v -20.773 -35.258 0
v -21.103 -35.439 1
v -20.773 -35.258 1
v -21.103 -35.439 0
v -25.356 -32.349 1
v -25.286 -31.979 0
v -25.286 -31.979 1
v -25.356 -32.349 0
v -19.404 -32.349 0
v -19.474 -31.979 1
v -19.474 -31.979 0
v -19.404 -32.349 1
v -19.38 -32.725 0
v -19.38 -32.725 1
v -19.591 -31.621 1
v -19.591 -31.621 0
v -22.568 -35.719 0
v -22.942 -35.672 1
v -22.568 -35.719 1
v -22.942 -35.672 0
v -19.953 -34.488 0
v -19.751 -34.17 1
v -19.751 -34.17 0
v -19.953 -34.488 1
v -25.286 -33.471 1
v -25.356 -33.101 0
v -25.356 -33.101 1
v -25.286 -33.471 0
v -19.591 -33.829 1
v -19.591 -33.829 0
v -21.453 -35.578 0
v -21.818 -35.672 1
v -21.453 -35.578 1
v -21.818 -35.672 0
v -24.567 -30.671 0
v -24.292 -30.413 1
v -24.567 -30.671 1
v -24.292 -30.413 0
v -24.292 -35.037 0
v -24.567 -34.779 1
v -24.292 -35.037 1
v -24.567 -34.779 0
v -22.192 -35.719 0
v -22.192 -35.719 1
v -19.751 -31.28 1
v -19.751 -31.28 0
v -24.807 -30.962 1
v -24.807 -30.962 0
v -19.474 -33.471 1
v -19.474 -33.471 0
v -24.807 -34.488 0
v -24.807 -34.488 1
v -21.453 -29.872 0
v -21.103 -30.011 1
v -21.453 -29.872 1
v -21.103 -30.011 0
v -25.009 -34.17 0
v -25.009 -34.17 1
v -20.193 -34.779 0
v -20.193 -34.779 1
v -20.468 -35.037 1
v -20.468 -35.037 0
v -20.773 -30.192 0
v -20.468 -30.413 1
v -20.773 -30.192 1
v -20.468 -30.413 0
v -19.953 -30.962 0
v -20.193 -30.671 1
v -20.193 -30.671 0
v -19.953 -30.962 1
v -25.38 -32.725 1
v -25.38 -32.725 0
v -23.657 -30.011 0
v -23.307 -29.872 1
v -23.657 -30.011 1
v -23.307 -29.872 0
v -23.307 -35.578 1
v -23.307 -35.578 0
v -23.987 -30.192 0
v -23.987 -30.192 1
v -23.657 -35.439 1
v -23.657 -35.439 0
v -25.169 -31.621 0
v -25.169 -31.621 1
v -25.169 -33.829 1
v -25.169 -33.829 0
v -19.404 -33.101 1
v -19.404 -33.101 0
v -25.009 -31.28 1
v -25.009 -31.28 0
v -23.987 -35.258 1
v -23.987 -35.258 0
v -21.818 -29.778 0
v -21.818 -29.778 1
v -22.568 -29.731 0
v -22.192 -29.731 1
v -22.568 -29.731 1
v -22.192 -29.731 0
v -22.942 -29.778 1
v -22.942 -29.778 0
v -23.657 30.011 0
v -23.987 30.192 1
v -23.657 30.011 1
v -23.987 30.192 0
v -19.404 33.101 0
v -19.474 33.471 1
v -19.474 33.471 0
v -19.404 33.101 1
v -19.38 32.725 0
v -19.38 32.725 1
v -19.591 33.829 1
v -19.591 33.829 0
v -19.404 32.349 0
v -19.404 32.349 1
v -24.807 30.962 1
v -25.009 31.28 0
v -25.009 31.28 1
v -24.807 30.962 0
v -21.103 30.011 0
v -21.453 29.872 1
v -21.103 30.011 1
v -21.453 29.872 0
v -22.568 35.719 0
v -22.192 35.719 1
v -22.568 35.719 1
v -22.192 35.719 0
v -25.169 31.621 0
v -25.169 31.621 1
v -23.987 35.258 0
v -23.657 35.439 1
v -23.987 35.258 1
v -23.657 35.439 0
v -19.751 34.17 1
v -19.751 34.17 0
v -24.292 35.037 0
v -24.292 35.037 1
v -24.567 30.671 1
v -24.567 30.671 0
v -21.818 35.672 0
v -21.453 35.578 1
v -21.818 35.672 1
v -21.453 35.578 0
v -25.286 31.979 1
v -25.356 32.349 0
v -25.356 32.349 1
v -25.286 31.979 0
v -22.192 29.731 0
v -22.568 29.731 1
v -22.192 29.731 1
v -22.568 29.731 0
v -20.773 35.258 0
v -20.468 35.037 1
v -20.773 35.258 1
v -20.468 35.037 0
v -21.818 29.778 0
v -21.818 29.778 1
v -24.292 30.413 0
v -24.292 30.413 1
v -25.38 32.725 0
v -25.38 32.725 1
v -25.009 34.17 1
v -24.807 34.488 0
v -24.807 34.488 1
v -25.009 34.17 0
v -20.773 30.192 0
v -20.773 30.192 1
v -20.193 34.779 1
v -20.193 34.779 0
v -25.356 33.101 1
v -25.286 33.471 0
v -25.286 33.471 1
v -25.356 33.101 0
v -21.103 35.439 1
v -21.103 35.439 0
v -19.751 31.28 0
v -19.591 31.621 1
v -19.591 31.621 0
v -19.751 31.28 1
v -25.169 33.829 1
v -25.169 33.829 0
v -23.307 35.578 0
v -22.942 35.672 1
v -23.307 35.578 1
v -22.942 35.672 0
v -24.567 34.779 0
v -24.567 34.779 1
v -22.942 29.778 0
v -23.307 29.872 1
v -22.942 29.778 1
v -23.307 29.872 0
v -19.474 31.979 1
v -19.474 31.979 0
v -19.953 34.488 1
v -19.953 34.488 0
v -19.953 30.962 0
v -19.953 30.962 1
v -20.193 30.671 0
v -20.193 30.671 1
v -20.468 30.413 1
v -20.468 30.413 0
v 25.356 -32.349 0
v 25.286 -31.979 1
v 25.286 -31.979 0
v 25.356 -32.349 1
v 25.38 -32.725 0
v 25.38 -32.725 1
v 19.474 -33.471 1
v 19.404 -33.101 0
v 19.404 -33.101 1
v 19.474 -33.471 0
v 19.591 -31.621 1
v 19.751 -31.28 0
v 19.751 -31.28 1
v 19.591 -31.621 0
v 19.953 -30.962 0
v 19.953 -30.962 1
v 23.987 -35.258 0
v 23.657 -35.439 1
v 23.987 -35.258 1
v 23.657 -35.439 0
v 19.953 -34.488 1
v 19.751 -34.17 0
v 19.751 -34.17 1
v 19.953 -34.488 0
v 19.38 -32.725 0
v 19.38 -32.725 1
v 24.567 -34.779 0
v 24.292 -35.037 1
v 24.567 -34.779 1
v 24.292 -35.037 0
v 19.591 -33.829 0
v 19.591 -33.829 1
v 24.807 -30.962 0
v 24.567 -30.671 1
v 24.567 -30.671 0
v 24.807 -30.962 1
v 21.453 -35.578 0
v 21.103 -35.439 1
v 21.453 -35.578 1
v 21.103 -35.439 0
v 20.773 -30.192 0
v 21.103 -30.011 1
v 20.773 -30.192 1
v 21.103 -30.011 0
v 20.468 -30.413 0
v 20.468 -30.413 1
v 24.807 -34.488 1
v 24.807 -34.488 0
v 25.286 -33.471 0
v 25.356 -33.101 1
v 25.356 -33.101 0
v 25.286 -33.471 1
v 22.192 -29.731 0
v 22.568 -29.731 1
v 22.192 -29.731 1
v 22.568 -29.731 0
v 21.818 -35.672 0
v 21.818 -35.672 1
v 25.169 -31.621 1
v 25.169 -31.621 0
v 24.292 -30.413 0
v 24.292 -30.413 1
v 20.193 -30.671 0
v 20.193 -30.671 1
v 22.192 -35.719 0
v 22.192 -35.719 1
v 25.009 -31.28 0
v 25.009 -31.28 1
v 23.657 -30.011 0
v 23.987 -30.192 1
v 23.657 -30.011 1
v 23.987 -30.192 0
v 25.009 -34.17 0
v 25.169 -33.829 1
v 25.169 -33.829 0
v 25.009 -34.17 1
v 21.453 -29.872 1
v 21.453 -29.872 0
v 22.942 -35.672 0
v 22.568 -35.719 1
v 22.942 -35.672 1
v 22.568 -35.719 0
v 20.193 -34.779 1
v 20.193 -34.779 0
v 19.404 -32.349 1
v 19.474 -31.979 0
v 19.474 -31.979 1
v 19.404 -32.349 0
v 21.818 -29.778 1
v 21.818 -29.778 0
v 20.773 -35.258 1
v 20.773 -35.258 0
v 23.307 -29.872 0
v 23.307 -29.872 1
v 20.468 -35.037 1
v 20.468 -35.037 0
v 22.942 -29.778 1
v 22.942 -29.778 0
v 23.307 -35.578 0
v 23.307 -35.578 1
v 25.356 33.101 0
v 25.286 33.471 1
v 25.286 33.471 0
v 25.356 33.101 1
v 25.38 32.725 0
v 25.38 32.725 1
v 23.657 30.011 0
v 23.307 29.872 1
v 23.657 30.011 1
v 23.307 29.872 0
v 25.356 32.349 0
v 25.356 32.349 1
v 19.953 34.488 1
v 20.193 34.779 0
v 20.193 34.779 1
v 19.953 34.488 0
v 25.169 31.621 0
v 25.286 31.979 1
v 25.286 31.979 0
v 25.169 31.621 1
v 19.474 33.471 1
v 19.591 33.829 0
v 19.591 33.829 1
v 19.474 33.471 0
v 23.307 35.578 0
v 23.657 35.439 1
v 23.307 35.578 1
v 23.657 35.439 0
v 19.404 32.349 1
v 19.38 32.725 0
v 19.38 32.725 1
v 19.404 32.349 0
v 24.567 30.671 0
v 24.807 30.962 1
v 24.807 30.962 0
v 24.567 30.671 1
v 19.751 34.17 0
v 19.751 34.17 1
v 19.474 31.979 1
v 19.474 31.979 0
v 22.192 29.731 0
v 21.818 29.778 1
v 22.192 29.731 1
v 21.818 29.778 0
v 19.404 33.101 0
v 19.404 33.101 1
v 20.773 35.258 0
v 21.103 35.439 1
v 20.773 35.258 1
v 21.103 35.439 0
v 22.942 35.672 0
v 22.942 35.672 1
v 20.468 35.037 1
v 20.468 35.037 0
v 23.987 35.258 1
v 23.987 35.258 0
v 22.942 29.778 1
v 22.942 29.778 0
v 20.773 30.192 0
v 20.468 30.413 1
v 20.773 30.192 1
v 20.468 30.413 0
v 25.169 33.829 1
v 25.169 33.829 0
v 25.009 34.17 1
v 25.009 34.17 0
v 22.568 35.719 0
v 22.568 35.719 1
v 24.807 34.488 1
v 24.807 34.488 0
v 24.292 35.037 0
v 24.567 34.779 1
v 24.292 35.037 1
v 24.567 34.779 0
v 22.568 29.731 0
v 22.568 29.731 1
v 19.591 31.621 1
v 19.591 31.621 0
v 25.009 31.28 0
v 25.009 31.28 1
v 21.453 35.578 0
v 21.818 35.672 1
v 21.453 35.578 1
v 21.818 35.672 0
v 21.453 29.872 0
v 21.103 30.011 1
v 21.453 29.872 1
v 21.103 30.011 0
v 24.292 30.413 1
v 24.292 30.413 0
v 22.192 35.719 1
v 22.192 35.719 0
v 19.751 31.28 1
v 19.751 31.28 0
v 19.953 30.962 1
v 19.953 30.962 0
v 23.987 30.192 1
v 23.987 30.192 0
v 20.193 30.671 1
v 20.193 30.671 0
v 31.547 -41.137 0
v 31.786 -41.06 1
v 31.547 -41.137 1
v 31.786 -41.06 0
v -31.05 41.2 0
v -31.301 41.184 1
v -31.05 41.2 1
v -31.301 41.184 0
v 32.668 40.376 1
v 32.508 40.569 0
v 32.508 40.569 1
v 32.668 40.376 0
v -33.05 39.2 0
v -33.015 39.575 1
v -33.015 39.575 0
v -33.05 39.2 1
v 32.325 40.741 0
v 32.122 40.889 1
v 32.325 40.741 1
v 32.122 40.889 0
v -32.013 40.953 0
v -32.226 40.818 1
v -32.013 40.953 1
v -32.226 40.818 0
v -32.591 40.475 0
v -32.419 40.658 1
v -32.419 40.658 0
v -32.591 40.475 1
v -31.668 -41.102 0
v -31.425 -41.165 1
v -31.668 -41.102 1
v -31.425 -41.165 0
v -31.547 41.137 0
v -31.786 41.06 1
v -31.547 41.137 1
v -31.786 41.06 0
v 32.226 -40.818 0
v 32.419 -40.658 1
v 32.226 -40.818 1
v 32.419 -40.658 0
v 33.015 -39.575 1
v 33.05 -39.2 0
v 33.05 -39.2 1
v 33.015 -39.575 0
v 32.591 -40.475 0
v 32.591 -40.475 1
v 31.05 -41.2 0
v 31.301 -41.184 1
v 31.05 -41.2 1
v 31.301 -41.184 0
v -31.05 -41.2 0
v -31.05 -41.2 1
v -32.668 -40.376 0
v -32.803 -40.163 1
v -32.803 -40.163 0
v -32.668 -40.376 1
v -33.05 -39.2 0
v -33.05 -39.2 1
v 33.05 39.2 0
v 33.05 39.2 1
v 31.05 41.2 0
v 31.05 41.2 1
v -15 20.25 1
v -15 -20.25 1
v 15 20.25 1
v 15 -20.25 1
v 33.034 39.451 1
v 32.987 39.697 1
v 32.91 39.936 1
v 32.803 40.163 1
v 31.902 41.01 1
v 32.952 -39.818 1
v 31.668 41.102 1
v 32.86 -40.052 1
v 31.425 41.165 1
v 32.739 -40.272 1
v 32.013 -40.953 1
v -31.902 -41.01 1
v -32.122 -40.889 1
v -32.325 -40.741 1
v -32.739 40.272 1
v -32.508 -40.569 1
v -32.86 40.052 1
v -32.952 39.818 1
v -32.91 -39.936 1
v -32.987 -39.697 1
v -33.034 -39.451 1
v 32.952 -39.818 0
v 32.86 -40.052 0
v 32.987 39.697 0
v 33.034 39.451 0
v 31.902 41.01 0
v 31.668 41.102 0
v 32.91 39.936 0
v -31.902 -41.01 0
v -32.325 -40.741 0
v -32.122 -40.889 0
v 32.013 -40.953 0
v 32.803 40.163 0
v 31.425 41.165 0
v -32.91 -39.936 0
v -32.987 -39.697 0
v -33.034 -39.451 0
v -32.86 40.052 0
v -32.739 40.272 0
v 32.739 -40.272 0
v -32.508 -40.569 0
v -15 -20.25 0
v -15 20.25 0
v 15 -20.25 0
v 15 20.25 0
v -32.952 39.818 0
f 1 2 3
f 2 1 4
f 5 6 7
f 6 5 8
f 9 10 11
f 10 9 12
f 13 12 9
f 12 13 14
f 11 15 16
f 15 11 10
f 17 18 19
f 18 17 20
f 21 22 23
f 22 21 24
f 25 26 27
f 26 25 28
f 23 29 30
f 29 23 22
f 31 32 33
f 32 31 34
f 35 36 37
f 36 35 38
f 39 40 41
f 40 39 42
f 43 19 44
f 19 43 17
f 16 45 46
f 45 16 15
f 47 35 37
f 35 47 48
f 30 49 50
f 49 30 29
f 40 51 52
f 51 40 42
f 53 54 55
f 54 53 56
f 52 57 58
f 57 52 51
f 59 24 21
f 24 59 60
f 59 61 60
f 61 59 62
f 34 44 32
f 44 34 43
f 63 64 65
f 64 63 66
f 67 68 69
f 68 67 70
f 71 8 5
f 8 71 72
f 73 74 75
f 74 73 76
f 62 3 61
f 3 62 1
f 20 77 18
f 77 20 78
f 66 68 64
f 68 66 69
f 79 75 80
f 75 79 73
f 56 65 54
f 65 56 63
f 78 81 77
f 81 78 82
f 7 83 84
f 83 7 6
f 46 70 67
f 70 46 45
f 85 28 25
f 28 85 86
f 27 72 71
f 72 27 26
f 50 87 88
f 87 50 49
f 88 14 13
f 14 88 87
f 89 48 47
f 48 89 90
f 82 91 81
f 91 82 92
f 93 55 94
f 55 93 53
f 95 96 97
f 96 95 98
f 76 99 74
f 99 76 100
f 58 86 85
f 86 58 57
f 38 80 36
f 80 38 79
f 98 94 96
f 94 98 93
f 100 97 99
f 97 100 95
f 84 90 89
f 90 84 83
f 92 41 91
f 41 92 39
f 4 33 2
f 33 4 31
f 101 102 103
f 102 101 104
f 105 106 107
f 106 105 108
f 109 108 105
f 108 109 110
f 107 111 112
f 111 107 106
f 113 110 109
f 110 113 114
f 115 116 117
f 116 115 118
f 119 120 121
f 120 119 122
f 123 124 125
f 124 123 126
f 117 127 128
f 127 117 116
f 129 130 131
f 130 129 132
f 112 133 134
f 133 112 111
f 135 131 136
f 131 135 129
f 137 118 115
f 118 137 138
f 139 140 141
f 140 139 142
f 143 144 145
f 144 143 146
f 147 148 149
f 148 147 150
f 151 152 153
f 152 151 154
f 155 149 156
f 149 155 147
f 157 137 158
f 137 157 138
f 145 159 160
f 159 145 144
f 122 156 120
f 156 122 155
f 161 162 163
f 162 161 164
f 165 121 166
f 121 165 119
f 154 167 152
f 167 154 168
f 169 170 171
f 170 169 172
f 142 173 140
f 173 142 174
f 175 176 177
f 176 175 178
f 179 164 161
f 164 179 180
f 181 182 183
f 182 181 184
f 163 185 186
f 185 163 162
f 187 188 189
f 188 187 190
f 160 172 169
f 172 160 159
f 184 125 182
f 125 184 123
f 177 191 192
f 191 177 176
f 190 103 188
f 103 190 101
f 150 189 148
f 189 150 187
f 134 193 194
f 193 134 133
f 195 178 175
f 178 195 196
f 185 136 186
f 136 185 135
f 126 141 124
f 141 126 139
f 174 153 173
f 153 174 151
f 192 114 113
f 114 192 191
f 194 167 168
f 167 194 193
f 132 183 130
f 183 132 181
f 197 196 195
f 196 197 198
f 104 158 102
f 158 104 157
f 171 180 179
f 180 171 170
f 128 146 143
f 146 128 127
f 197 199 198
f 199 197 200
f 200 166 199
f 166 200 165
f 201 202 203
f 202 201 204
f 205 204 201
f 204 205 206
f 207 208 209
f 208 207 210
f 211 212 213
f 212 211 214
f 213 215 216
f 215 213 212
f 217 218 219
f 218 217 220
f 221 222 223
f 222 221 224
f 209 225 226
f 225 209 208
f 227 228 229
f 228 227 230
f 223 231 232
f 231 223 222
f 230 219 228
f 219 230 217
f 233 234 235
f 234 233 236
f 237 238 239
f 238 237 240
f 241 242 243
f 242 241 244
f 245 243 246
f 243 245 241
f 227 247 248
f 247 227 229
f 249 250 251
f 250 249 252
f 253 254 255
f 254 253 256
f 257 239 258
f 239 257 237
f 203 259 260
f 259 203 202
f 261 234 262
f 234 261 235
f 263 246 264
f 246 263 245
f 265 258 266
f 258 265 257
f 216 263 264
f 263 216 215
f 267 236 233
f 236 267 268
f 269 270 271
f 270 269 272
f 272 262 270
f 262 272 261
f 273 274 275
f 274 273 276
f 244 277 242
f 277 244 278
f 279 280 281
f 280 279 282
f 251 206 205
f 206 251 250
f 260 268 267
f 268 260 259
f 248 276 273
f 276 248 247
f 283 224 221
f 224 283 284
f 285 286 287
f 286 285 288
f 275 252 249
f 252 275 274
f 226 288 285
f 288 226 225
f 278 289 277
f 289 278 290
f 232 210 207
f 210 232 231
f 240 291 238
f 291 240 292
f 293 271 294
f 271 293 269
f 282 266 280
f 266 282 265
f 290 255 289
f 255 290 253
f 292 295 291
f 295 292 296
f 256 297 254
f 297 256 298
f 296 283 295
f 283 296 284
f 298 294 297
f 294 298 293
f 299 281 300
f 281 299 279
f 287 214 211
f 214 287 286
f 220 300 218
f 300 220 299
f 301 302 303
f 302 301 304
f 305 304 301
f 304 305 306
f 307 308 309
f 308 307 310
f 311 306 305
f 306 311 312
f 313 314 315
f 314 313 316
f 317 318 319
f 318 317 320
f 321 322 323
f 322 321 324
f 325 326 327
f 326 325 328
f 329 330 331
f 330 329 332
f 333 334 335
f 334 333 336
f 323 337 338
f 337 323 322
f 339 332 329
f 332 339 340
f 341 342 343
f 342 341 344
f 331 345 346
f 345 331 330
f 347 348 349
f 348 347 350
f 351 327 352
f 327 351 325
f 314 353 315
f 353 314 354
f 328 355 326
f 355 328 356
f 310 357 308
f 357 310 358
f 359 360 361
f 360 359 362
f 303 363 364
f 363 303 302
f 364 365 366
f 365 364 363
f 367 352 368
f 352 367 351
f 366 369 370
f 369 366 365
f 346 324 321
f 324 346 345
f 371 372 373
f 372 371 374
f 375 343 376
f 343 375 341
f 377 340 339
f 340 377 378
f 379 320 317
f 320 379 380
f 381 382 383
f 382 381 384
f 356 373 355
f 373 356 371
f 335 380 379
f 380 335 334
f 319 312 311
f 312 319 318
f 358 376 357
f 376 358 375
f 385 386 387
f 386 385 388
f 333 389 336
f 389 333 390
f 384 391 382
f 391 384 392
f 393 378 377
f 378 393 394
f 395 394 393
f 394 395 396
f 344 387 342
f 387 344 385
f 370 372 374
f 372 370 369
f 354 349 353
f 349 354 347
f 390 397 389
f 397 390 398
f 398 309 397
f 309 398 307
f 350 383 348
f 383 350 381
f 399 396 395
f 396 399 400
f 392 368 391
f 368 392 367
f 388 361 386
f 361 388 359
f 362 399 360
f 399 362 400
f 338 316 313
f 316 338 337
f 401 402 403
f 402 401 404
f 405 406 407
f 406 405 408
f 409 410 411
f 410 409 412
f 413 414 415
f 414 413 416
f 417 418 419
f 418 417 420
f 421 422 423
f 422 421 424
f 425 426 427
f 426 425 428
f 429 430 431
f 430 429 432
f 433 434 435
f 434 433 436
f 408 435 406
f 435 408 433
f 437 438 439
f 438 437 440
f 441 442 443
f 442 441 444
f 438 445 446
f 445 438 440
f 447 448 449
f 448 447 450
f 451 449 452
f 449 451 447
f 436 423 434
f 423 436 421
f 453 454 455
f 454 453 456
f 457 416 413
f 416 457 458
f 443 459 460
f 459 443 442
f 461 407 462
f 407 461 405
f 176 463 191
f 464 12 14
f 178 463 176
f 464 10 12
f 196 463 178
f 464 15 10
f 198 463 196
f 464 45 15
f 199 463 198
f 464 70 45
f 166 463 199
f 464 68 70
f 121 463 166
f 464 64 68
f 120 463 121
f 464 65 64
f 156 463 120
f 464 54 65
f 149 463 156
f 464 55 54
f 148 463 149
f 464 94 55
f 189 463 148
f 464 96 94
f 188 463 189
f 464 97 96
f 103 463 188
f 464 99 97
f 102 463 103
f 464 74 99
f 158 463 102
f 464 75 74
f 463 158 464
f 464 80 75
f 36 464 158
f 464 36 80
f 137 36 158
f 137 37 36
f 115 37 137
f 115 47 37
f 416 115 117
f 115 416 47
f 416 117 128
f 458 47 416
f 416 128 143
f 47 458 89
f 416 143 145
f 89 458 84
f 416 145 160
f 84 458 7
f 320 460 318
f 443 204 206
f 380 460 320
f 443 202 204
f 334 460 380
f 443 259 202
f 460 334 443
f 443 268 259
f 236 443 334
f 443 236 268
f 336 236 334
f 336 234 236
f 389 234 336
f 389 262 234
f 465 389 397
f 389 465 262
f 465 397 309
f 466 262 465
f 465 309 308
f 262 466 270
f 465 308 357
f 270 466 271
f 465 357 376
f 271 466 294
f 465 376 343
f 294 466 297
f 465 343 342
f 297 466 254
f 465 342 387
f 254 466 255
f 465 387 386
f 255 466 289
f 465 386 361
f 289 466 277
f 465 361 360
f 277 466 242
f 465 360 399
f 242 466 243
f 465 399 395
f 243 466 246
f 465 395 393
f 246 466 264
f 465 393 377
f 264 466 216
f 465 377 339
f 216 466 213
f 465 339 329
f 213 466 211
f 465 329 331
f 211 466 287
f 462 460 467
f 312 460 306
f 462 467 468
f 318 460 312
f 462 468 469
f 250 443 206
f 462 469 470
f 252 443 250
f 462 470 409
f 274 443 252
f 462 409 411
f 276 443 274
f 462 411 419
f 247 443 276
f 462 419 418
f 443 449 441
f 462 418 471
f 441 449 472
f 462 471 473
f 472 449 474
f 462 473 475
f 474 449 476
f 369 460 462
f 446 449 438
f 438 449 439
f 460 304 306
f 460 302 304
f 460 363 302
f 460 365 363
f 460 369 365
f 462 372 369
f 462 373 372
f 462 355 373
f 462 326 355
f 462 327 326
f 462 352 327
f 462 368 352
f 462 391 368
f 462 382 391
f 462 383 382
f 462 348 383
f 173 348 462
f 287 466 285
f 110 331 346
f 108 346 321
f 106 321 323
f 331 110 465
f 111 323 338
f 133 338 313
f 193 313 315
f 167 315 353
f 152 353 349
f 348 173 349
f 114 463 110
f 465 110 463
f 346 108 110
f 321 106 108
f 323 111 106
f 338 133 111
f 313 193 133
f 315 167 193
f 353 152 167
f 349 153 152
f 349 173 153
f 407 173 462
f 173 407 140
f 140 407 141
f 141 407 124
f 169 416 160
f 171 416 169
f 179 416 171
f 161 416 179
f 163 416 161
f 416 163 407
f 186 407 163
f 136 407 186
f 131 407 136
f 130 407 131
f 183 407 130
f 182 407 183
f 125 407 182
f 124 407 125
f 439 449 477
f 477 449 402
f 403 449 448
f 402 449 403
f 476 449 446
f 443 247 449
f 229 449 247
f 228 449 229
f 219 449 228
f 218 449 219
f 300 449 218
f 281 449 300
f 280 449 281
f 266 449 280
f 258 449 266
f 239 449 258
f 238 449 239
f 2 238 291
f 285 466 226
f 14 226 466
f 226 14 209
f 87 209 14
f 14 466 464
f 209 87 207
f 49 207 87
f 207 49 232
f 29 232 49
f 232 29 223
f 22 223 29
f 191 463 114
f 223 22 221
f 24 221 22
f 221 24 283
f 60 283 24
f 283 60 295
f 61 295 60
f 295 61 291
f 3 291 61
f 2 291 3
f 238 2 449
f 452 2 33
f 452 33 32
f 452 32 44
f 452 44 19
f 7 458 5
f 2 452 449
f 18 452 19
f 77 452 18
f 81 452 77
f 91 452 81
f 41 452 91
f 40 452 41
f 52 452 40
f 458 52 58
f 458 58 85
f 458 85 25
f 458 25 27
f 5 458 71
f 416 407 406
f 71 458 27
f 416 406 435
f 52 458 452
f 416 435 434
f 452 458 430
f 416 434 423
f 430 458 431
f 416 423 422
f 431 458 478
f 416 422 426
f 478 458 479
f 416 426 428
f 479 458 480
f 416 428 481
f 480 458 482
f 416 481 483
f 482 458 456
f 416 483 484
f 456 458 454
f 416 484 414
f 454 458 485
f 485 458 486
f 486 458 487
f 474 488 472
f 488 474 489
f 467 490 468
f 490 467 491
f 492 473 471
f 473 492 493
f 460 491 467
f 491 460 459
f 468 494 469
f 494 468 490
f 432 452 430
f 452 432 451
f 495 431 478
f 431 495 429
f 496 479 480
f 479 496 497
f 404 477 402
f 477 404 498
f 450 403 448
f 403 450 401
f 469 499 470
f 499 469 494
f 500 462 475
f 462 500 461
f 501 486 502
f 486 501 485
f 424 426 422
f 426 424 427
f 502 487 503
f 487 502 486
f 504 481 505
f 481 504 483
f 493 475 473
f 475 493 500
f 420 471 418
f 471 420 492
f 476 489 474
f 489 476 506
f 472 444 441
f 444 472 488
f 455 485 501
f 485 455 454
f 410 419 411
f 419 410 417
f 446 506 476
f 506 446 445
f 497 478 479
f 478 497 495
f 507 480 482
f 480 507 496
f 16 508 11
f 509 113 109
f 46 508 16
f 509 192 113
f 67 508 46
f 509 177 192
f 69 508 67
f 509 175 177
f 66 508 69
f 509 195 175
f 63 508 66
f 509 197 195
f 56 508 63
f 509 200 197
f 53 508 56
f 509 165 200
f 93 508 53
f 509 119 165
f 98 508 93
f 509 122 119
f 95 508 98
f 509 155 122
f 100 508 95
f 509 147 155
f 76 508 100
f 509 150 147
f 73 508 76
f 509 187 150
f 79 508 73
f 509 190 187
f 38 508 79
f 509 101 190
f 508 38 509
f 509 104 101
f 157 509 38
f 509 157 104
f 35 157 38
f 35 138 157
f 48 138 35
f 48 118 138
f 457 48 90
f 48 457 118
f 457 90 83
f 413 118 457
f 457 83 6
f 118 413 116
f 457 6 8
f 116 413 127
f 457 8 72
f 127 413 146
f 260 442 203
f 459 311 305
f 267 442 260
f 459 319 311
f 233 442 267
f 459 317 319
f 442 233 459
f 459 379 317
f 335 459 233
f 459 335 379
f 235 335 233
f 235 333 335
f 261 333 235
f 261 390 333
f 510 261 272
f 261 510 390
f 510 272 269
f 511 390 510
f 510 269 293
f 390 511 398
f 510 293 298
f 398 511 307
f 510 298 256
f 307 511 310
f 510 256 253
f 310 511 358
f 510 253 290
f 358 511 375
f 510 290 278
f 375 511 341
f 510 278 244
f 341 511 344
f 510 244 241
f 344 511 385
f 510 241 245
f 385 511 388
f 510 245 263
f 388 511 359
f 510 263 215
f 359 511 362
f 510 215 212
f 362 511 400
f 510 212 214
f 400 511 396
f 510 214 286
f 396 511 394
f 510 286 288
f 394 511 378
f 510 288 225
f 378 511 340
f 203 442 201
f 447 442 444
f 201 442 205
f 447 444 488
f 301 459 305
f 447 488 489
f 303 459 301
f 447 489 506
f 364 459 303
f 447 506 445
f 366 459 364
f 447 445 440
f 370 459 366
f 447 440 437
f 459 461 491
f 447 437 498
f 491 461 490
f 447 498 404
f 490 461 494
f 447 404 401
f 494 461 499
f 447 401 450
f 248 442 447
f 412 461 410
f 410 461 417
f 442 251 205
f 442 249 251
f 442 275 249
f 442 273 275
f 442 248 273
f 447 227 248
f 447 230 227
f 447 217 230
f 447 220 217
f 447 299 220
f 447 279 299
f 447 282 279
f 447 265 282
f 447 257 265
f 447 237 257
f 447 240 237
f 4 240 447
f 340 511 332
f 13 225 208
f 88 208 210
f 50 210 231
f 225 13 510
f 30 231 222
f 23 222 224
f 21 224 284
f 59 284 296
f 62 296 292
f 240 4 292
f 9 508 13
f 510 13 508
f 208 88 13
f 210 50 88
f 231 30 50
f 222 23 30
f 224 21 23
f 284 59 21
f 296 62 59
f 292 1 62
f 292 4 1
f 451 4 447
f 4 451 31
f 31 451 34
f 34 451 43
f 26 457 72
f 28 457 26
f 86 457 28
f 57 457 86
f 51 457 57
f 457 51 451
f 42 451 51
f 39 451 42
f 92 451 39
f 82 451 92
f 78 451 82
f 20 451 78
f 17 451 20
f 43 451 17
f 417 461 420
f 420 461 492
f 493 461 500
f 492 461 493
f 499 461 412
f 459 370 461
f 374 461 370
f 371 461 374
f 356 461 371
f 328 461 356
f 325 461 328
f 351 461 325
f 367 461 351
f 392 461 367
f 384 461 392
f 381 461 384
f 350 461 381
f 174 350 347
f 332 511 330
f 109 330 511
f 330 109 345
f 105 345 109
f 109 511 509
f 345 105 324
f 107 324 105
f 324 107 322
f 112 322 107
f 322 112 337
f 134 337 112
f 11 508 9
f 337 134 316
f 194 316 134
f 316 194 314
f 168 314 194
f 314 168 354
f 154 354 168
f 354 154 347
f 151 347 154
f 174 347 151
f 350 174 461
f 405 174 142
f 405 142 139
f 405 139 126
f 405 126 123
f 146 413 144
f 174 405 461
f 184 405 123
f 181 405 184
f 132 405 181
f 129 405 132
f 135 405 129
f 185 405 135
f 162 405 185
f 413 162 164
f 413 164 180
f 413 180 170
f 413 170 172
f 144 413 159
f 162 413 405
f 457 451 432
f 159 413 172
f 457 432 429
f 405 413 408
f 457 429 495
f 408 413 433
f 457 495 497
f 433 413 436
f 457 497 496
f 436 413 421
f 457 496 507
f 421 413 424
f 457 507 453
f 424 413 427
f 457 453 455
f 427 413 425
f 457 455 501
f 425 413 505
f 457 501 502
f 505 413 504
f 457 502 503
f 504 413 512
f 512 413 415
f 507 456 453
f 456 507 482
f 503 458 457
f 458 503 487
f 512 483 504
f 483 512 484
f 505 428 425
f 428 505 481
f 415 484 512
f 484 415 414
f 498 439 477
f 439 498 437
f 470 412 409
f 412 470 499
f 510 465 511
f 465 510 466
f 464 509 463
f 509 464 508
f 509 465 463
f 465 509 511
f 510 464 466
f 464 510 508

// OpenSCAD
// mounting plate parameters
w_plate = 66.1;
l_plate = 82.4;
h_plate = 1;
r_plate_corner = 2;

// bracket mounting hole parameters
d_plate_bolt = 6;
x_hole_space = 38.76+d_plate_bolt;
y_hole_space = 59.45+d_plate_bolt;

// bracket opening parameters
w_opening = 30;
l_opening = 40.5;

$fn=50;


module mounting_plate() {
    difference() {
        // extrude to spec'd height
        linear_extrude(height=h_plate) {
            // add corners
            offset(r=r_plate_corner)
            // create square plate w/o corners
            square([w_plate-r_plate_corner*2, l_plate-r_plate_corner*2], center=true);
        }
        // create 4 holes based on spacing parameters to be subtracted
        for (i=[-1:2:1]) {
            for (j=[-1:2:1]) {
                translate([i*x_hole_space/2, j*y_hole_space/2,h_plate/2])
                cylinder(h=2*h_plate, r=d_plate_bolt/2, center=true);
            }
        }
        translate([0,0,h_plate/2])
            cube([w_opening,l_opening,2*h_plate],center=true);
    }
}

mounting_plate();
